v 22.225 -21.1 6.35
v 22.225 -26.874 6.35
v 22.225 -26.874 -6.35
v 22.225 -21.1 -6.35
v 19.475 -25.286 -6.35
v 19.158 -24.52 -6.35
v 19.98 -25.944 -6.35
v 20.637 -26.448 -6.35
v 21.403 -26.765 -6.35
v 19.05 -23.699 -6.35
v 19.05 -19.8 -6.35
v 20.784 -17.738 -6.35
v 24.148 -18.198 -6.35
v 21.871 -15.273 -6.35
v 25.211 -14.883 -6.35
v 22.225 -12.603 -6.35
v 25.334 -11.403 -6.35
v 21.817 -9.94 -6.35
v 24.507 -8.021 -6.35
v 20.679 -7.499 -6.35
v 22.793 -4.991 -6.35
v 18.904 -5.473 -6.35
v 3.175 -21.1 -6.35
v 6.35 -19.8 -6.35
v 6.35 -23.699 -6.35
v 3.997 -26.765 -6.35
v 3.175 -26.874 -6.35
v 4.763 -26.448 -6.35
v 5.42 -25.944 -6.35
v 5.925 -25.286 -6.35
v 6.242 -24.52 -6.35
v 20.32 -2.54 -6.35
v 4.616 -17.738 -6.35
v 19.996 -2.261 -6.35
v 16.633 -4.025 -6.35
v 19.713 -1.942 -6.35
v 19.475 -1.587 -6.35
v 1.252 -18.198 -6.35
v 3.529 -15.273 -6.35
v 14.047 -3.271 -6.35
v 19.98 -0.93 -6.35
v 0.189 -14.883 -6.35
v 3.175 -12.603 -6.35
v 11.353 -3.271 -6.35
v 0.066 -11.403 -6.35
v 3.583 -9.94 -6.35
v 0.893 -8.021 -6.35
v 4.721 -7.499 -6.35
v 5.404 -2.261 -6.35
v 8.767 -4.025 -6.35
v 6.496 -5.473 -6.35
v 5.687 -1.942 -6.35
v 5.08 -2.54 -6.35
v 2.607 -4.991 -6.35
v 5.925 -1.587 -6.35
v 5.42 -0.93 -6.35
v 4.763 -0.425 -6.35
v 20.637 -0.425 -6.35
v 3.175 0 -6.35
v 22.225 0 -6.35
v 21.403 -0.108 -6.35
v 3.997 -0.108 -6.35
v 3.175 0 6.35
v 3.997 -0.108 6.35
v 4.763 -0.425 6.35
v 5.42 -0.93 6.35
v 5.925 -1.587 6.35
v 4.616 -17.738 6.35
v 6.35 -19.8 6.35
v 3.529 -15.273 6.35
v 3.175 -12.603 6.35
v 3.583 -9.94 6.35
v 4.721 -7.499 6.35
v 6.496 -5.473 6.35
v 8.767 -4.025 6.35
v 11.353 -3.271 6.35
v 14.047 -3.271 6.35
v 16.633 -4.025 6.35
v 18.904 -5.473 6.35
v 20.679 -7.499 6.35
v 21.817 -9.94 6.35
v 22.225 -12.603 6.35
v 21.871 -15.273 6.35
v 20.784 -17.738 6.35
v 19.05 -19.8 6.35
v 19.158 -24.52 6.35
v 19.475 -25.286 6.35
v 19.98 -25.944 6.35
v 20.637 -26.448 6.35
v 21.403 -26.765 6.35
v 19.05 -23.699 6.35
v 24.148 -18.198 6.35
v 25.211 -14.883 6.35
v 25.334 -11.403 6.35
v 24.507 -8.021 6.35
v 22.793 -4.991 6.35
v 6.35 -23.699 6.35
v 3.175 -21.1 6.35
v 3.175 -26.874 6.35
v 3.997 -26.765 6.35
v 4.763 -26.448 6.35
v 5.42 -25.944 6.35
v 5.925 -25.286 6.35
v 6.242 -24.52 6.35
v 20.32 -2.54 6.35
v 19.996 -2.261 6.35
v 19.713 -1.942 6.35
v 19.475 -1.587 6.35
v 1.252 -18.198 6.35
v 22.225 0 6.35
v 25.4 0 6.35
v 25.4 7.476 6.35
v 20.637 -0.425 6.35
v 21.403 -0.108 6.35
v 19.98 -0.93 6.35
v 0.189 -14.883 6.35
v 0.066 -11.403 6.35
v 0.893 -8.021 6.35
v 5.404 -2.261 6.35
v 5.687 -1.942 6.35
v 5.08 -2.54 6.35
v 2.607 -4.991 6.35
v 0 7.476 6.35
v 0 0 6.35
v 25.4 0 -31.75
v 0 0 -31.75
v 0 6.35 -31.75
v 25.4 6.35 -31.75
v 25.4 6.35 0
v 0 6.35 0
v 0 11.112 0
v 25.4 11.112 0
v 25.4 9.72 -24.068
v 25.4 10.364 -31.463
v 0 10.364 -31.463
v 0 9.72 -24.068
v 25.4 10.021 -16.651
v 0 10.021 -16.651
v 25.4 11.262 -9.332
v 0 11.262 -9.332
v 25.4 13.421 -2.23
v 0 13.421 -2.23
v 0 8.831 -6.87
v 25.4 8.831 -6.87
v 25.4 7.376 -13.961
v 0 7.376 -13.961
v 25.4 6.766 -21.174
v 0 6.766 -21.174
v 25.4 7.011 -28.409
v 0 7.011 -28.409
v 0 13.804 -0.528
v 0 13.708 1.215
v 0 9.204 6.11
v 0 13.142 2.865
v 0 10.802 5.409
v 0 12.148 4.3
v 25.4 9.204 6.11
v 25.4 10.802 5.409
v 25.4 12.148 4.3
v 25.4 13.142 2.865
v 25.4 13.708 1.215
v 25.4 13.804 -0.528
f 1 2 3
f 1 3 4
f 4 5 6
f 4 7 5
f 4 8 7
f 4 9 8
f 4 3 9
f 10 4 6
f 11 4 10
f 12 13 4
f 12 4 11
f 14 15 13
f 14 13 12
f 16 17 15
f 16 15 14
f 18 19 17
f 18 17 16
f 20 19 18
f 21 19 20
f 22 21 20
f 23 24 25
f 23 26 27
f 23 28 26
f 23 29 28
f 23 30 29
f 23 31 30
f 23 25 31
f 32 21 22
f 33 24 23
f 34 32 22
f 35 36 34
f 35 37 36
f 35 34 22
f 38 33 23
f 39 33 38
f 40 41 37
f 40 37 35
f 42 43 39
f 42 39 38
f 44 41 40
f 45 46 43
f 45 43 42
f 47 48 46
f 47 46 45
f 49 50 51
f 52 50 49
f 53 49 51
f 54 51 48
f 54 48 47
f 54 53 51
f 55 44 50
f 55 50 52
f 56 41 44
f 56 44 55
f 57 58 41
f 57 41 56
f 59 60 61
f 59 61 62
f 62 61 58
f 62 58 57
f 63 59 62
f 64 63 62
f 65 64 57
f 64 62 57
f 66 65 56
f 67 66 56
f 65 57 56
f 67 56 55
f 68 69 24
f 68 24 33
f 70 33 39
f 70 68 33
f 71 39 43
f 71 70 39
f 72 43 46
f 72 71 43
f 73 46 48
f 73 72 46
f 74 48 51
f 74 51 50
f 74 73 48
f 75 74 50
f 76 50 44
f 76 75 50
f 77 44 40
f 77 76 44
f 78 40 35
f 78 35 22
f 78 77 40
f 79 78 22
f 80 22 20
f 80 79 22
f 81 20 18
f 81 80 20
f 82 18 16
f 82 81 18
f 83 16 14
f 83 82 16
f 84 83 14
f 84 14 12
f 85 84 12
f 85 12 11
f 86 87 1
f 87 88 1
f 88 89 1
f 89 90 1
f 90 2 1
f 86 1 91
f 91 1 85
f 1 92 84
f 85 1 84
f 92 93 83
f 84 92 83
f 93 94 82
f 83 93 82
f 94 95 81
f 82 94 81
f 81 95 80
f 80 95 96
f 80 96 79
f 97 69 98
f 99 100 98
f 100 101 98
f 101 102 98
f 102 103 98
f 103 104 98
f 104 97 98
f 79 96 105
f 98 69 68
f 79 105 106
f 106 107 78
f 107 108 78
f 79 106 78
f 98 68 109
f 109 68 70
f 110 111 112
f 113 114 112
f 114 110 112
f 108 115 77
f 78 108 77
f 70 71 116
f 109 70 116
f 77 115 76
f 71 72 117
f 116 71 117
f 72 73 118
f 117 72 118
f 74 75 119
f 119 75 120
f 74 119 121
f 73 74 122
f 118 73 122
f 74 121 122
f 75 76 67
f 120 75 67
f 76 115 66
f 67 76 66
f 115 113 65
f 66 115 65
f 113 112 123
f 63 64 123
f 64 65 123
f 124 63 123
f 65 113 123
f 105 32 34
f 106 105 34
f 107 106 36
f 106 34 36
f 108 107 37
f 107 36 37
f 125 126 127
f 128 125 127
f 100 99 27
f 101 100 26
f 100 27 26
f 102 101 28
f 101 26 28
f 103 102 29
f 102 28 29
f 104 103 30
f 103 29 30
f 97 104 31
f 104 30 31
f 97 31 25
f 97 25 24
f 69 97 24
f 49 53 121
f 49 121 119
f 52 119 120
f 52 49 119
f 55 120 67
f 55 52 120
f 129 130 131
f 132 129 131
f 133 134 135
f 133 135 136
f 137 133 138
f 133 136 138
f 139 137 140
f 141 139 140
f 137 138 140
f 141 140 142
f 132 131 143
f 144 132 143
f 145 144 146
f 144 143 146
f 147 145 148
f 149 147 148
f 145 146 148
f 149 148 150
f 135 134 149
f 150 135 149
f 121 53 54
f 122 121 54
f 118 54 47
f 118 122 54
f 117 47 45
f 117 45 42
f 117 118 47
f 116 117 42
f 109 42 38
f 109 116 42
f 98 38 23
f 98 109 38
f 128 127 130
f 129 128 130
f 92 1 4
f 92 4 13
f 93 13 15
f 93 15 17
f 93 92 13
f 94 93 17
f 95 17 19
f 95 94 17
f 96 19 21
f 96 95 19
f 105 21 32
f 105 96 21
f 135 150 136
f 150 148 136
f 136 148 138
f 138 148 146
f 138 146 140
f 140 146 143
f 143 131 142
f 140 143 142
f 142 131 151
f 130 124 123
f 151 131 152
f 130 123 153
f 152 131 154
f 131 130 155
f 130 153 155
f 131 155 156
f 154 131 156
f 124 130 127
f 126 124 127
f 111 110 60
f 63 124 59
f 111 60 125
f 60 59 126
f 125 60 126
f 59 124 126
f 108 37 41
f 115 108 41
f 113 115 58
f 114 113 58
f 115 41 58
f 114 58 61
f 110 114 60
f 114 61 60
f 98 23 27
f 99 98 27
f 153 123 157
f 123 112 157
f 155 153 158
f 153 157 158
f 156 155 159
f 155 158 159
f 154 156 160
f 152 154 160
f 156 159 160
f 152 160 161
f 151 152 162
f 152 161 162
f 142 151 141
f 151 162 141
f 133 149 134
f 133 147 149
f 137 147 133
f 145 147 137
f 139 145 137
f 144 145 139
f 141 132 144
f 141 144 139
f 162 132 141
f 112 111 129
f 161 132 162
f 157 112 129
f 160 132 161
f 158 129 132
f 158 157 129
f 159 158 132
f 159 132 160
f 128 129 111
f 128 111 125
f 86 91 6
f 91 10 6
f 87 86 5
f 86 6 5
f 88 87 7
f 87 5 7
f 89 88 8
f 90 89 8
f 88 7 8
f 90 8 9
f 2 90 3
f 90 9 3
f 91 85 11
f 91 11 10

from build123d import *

# Parameters (mm, degrees)
F0_W        = 6.35
F0_H        = 6.35
F0_H_2      = 31.75
F1_DEPTH    = 25.4
F3_DEPTH    = 12.7
F4_R        = 3.17499
F5_T1_DEPTH = 12.7
F6_R        = 6.35
F7_T1_DEPTH = 42.7131376889


# Not quite as in the source:
# - a fillet or chamfer that OpenCascade refuses, or shapes differently, is made with other operations: its cross-section is extruded or revolved along the edge and cut away or added
# - a fillet or chamfer is up to 0.001 mm smaller than in the source, because OpenCascade refuses the exact size


with BuildPart() as f1:
    # F0 (on Right) → F1 (new body)
    with BuildSketch(Plane.YZ):
        with Locations((3.175, 3.175)):
            Rectangle(F0_W, F0_H)
        with Locations((3.175, -15.875)):
            Rectangle(F0_W, F0_H_2)
        with BuildLine():
            Line((6.35, 6.35), (6.35, 0))
            Line((6.35, 0), (11.1125, 0))
            ThreePointArc((11.1125, 0), (7.1582593776, -15.6298064568), (7.4156091525, -31.75))
            Line((7.4156091525, -31.75), (10.4078971116, -31.75))
            ThreePointArc((10.4078971116, -31.75), (10.6800087855, -12.0972684736), (17.4625, 6.35))
            Line((17.4625, 6.35), (6.35, 6.35))
        make_face()
    extrude(amount=F1_DEPTH)

    # F2 (on face) → F3 (join)
    with BuildSketch(Plane.XY.offset(6.35)):
        with BuildLine():
            Line((19.05, 0), (6.35, 0))
            Line((6.35, 0), (6.35, -1.7014773719))
            ThreePointArc((6.35, -1.7014773719), (0.166760111, -10.6486838652), (3.175, -21.1002604126))
            ThreePointArc((3.175, -21.1002604126), (4.6568881715, -22.5284460682), (6.35, -23.6985226281))
            Line((6.35, -23.6985226281), (6.35, -19.7995158286))
            ThreePointArc((6.35, -19.7995158286), (12.7, -3.175), (19.05, -19.7995158286))
            Line((19.05, -19.7995158286), (19.05, -23.6985226281))
            ThreePointArc((19.05, -23.6985226281), (20.7431118285, -22.5284460682), (22.225, -21.1002604126))
            ThreePointArc((22.225, -21.1002604126), (25.233239889, -10.6486838652), (19.05, -1.7014773719))
            Line((19.05, -1.7014773719), (19.05, 0))
        make_face()
        with BuildLine():
            ThreePointArc((6.35, -23.6985226281), (4.6568881715, -22.5284460682), (3.175, -21.1002604126))
            Line((3.175, -21.1002604126), (3.175, -26.8735226281))
            Line((3.175, -26.8735226281), (6.35, -26.8735226281))
            Line((6.35, -26.8735226281), (6.35, -23.6985226281))
        make_face()
        with BuildLine():
            Line((22.225, -26.8735226281), (22.225, -21.1002604126))
            ThreePointArc((22.225, -21.1002604126), (20.7431118285, -22.5284460682), (19.05, -23.6985226281))
            Line((19.05, -23.6985226281), (19.05, -26.8735226281))
            Line((19.05, -26.8735226281), (22.225, -26.8735226281))
        make_face()
    extrude(amount=-F3_DEPTH)

    # F4 (radius 3.175 in the source; OpenCascade refuses exactly that, so slightly less here)
    f4_edges = [f1.edges().sort_by_distance(p)[0] for p in [
        (6.35, -26.873523, 0),
        (19.05, -26.873523, 0),
    ]]
    fillet(f4_edges, radius=F4_R)

    # F5: fillet of radius 3.175 on 4 edges, made by hand

    # F5_s2 → F5_t1 (join)
    with BuildSketch(Plane.XY.offset(-6.35)):
        with BuildLine():
            ThreePointArc((5.08, -2.54), (6.0148063314, -1.4199031657), (6.35, 0))
            Line((6.35, 0), (6.35, -1.7014773719))
            ThreePointArc((6.35, -1.7014773719), (5.7024286321, -2.1016984875), (5.08, -2.54))
        make_face()
        with BuildLine():
            ThreePointArc((20.32, -2.54), (19.3851936686, -1.4199031657), (19.05, 0))
            Line((19.05, 0), (19.05, -1.7014773719))
            ThreePointArc((19.05, -1.7014773719), (19.6975713679, -2.1016984875), (20.32, -2.54))
        make_face()
        with BuildLine():
            ThreePointArc((19.05, -3.175), (19.9799359697, -0.9299359697), (22.225, 0))
            Line((22.225, 0), (19.05, 0))
            Line((19.05, 0), (19.05, -3.175))
        make_face()
        with BuildLine():
            ThreePointArc((3.175, 0), (5.4200640303, -0.9299359697), (6.35, -3.175))
            Line((6.35, -3.175), (6.35, 0))
            Line((6.35, 0), (3.175, 0))
        make_face()
    extrude(amount=F5_T1_DEPTH)

    # F6
    f6_edges = [f1.edges().sort_by_distance(p)[0] for p in [
        (12.7, 17.4625, 6.35),
    ]]
    fillet(f6_edges, radius=F6_R)

    # F7: chamfer of 3.175 on 1 edges, made by hand

    # F7_s2 → F7_t1 (cut)
    with BuildSketch(Plane.YZ.offset(-8.6565688444)):
        with BuildLine():
            Line((10.772273237, -31.8355341736), (6.9175477916, -28.3233800406))
            Line((6.9175477916, -28.3233800406), (6.8543218231, -28.3292729944))
            ThreePointArc((6.8543218231, -28.3292729944), (7.1217830499, -30.0420734544), (7.3528018544, -31.759353786))
            Line((7.3528018544, -31.759353786), (7.4156091525, -31.8135))
            ThreePointArc((7.4156091525, -31.8135), (9.0939411948, -31.8135), (10.772273237, -31.8990341736))
            Line((10.772273237, -31.8990341736), (10.772273237, -31.8355341736))
        make_face()
    extrude(amount=F7_T1_DEPTH, mode=Mode.SUBTRACT)


solid = f1.part
